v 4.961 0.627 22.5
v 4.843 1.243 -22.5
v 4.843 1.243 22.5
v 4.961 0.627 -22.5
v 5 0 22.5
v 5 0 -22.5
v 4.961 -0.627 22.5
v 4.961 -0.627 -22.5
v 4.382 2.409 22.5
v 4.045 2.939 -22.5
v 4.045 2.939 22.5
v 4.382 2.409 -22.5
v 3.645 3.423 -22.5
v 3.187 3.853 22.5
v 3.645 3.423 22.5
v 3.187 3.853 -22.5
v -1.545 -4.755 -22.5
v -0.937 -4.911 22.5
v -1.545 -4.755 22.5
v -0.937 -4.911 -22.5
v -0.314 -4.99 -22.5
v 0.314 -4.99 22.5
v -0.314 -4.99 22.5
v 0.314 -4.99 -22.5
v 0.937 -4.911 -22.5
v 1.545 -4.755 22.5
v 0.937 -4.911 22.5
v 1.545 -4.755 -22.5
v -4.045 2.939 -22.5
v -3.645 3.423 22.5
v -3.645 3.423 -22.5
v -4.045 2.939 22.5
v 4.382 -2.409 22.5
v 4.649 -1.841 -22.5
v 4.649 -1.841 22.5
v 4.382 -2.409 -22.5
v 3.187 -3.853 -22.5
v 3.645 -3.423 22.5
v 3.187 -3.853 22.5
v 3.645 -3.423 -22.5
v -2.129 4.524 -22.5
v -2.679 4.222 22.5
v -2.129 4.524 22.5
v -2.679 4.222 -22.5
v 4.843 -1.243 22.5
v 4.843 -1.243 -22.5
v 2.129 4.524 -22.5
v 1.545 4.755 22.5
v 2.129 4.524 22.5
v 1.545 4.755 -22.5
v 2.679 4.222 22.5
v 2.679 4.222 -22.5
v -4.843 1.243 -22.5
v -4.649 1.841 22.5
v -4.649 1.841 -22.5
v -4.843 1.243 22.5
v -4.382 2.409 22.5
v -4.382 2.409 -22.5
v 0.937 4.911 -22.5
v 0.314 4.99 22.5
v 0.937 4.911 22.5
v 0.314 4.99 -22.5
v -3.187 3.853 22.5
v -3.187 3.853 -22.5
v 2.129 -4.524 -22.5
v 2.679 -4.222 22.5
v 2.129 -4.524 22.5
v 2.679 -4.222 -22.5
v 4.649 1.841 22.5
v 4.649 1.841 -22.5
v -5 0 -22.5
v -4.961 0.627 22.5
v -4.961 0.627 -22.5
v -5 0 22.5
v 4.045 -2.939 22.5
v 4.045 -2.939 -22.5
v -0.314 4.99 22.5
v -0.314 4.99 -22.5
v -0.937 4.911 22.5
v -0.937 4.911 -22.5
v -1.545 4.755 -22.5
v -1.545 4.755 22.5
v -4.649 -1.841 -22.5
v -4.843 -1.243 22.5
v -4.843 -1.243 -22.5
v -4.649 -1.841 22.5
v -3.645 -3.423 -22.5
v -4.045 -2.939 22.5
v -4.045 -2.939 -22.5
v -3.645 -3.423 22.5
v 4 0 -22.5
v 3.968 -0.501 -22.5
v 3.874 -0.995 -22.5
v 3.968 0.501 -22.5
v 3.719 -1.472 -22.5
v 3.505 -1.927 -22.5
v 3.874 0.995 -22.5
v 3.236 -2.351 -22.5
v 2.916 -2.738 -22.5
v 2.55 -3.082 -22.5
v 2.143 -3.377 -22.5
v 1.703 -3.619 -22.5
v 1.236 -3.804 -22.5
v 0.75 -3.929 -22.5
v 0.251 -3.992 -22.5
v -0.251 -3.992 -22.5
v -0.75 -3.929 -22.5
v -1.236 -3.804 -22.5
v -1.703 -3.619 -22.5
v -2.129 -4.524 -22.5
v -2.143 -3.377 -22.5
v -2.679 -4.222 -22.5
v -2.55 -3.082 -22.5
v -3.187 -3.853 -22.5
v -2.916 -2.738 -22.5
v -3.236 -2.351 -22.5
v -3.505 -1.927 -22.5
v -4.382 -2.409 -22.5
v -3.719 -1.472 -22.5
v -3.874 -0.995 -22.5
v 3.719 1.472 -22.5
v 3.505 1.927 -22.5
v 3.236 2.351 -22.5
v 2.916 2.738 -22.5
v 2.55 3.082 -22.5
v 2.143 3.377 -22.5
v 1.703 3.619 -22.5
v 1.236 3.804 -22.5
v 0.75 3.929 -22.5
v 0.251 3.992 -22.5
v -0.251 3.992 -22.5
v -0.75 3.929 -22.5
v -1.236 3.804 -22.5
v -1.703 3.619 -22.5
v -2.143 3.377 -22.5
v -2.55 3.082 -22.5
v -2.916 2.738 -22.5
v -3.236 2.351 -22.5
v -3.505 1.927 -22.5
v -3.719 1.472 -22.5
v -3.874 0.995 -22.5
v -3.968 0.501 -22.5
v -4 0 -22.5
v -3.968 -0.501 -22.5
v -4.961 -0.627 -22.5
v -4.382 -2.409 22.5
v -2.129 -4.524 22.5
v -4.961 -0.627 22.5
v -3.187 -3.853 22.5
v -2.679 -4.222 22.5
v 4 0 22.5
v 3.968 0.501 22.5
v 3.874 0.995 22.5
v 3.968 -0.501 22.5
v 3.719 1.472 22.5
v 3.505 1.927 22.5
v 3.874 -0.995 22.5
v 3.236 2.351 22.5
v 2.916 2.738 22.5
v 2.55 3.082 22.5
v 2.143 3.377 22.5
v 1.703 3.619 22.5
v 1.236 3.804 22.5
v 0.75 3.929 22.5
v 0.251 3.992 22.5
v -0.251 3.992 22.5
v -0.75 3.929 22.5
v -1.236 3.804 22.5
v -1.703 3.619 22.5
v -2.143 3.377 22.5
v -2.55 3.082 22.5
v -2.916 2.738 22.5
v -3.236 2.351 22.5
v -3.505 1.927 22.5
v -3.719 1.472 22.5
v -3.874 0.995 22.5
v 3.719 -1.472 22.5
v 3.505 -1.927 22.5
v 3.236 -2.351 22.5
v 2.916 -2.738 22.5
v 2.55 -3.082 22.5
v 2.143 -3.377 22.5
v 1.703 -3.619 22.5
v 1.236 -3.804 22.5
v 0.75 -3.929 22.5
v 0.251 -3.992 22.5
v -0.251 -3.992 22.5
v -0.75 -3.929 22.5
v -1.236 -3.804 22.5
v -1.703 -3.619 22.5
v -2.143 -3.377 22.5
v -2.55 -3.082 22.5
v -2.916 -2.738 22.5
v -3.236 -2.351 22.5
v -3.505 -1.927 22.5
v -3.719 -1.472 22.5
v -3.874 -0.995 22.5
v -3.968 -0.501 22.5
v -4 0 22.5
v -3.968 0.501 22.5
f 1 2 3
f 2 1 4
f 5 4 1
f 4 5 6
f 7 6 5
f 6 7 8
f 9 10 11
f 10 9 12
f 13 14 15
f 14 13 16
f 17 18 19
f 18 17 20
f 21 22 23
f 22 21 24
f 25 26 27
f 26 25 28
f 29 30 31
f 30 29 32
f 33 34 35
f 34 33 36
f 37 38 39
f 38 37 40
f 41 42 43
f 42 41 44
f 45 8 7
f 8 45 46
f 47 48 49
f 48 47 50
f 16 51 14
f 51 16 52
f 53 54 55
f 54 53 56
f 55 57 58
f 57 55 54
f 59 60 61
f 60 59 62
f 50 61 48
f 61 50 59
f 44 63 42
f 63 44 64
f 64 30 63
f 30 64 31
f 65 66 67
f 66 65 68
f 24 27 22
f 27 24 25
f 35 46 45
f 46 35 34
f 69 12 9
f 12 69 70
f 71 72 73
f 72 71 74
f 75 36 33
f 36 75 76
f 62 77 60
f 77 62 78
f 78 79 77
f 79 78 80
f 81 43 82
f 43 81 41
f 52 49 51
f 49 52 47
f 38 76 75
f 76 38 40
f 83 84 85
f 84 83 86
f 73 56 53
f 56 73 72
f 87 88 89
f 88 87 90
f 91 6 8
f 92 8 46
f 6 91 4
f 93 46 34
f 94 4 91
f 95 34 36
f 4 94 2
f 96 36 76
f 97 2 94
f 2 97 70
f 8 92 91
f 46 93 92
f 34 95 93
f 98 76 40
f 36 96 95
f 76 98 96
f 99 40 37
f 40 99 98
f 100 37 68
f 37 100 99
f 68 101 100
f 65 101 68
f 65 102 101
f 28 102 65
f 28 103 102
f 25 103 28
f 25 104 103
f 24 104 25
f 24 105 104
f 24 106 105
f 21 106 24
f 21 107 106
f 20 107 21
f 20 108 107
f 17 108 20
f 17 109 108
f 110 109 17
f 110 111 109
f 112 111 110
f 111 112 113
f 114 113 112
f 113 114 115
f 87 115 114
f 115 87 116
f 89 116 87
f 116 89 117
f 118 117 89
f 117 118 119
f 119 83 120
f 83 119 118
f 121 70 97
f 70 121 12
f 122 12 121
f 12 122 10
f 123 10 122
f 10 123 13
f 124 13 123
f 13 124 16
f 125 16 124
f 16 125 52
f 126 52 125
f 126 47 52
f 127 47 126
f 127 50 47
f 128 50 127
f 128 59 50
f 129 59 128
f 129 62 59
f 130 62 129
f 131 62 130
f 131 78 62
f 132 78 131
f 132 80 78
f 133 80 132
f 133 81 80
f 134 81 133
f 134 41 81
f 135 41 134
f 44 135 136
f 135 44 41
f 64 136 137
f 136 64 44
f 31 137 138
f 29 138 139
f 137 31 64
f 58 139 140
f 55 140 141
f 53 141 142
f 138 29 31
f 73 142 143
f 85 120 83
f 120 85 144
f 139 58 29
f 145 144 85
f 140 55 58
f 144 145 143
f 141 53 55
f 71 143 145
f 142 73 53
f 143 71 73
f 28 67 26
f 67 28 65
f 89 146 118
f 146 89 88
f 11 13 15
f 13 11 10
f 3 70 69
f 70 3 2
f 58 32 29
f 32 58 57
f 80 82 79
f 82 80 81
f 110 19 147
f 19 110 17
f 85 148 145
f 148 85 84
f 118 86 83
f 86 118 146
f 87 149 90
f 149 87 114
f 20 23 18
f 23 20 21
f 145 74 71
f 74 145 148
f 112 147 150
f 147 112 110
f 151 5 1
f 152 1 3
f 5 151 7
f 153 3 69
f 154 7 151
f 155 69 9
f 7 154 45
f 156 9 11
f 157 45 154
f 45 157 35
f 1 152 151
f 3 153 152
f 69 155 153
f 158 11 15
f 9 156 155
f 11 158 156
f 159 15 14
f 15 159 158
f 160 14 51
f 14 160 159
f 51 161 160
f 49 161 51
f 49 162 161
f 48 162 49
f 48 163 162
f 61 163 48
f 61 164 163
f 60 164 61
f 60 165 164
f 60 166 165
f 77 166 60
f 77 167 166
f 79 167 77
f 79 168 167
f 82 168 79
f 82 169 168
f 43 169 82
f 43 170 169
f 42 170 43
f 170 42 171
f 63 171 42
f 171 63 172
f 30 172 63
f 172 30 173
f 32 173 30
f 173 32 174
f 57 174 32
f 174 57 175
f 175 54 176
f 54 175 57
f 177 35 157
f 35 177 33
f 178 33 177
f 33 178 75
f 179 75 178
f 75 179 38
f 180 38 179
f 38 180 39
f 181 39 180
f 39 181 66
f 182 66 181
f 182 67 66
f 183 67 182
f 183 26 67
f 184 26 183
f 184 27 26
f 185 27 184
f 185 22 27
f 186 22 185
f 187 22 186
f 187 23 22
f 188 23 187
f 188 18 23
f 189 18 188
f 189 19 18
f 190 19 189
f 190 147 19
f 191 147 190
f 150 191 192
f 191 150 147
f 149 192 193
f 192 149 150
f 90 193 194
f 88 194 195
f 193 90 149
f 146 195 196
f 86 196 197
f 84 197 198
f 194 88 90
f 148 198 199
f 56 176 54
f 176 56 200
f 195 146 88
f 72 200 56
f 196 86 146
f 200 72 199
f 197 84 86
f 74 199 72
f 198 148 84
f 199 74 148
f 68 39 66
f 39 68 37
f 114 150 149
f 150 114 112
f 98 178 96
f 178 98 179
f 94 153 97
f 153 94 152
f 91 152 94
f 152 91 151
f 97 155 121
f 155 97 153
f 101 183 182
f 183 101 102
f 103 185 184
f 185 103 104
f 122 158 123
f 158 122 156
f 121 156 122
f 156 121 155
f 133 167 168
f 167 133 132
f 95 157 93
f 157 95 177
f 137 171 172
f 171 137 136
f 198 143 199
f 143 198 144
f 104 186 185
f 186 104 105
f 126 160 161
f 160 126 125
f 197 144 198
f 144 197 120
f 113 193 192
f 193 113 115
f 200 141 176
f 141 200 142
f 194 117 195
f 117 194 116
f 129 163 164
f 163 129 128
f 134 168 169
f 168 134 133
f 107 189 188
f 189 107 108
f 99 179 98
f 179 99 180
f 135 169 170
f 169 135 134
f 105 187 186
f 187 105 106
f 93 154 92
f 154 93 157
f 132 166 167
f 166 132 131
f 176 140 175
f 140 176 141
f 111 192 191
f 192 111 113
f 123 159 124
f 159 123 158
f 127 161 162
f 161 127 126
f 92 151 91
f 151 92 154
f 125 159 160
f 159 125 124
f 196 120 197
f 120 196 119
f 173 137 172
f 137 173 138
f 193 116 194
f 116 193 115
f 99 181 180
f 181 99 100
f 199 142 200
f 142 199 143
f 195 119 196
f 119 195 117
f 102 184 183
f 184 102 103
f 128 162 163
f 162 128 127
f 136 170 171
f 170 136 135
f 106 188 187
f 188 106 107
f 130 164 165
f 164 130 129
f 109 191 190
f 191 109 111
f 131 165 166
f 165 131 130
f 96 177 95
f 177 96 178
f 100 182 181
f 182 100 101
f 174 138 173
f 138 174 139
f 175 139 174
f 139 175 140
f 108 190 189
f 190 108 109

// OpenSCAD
$fn = 50;


difference() {
	union() {
		translate(v = [0, 0, -22.5000000000]) {
			cylinder(h = 45, r = 5.0000000000);
		}
	}
	union() {
		translate(v = [0, 0, -100.0000000000]) {
			cylinder(h = 200, r = 4.0000000000);
		}
	}
}
